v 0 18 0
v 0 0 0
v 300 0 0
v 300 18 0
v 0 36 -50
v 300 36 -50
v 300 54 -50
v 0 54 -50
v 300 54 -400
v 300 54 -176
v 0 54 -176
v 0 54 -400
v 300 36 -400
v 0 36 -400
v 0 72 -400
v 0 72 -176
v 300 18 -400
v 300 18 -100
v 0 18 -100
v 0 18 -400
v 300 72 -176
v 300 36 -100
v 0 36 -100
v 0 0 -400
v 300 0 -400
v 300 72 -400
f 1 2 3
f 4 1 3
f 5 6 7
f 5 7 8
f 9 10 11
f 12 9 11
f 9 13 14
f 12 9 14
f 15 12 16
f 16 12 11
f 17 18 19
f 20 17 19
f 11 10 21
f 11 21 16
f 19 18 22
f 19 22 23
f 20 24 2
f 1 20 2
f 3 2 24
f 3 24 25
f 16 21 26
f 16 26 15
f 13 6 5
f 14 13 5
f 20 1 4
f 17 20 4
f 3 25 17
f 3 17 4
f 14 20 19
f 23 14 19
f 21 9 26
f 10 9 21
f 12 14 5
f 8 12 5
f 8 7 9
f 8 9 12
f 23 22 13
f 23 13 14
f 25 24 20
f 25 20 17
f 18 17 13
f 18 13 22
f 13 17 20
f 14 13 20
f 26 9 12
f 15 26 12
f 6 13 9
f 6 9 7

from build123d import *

# Parameters (mm, degrees)
F0_W     = 300
F0_H     = 400
F1_DEPTH = 18
F2_W     = 300
F2_H     = 300
F3_DEPTH = 18
F4_W     = 300
F4_H     = 350
F5_DEPTH = 18
F6_W     = 300
F6_H     = 224
F7_DEPTH = 18


with BuildPart() as f1:
    # F0 (on Front) → F1 (new body)
    with BuildSketch(Plane.XZ):
        with Locations((150, -200)):
            Rectangle(F0_W, F0_H)
    extrude(amount=-F1_DEPTH)


with BuildPart() as f3:
    # F2 (on face) → F3 (new body)
    with BuildSketch(Plane(origin=(0, 18, 0), x_dir=(-1, 0, 0), z_dir=(0, 1, 0))):
        with Locations((-150, -250)):
            Rectangle(F2_W, F2_H)
    extrude(amount=F3_DEPTH)


with BuildPart() as f5:
    # F4 (on face) → F5 (new body)
    with BuildSketch(Plane(origin=(0, 36, 0), x_dir=(-1, 0, 0), z_dir=(0, 1, 0))):
        with Locations((-150, -225)):
            Rectangle(F4_W, F4_H)
    extrude(amount=F5_DEPTH)


with BuildPart() as f7:
    # F6 (on face) → F7 (new body)
    with BuildSketch(Plane(origin=(0, 54, 0), x_dir=(-1, 0, 0), z_dir=(0, 1, 0))):
        with Locations((-150, -288)):
            Rectangle(F6_W, F6_H)
    extrude(amount=F7_DEPTH)


solid = Compound([f1.part, f3.part, f5.part, f7.part])
